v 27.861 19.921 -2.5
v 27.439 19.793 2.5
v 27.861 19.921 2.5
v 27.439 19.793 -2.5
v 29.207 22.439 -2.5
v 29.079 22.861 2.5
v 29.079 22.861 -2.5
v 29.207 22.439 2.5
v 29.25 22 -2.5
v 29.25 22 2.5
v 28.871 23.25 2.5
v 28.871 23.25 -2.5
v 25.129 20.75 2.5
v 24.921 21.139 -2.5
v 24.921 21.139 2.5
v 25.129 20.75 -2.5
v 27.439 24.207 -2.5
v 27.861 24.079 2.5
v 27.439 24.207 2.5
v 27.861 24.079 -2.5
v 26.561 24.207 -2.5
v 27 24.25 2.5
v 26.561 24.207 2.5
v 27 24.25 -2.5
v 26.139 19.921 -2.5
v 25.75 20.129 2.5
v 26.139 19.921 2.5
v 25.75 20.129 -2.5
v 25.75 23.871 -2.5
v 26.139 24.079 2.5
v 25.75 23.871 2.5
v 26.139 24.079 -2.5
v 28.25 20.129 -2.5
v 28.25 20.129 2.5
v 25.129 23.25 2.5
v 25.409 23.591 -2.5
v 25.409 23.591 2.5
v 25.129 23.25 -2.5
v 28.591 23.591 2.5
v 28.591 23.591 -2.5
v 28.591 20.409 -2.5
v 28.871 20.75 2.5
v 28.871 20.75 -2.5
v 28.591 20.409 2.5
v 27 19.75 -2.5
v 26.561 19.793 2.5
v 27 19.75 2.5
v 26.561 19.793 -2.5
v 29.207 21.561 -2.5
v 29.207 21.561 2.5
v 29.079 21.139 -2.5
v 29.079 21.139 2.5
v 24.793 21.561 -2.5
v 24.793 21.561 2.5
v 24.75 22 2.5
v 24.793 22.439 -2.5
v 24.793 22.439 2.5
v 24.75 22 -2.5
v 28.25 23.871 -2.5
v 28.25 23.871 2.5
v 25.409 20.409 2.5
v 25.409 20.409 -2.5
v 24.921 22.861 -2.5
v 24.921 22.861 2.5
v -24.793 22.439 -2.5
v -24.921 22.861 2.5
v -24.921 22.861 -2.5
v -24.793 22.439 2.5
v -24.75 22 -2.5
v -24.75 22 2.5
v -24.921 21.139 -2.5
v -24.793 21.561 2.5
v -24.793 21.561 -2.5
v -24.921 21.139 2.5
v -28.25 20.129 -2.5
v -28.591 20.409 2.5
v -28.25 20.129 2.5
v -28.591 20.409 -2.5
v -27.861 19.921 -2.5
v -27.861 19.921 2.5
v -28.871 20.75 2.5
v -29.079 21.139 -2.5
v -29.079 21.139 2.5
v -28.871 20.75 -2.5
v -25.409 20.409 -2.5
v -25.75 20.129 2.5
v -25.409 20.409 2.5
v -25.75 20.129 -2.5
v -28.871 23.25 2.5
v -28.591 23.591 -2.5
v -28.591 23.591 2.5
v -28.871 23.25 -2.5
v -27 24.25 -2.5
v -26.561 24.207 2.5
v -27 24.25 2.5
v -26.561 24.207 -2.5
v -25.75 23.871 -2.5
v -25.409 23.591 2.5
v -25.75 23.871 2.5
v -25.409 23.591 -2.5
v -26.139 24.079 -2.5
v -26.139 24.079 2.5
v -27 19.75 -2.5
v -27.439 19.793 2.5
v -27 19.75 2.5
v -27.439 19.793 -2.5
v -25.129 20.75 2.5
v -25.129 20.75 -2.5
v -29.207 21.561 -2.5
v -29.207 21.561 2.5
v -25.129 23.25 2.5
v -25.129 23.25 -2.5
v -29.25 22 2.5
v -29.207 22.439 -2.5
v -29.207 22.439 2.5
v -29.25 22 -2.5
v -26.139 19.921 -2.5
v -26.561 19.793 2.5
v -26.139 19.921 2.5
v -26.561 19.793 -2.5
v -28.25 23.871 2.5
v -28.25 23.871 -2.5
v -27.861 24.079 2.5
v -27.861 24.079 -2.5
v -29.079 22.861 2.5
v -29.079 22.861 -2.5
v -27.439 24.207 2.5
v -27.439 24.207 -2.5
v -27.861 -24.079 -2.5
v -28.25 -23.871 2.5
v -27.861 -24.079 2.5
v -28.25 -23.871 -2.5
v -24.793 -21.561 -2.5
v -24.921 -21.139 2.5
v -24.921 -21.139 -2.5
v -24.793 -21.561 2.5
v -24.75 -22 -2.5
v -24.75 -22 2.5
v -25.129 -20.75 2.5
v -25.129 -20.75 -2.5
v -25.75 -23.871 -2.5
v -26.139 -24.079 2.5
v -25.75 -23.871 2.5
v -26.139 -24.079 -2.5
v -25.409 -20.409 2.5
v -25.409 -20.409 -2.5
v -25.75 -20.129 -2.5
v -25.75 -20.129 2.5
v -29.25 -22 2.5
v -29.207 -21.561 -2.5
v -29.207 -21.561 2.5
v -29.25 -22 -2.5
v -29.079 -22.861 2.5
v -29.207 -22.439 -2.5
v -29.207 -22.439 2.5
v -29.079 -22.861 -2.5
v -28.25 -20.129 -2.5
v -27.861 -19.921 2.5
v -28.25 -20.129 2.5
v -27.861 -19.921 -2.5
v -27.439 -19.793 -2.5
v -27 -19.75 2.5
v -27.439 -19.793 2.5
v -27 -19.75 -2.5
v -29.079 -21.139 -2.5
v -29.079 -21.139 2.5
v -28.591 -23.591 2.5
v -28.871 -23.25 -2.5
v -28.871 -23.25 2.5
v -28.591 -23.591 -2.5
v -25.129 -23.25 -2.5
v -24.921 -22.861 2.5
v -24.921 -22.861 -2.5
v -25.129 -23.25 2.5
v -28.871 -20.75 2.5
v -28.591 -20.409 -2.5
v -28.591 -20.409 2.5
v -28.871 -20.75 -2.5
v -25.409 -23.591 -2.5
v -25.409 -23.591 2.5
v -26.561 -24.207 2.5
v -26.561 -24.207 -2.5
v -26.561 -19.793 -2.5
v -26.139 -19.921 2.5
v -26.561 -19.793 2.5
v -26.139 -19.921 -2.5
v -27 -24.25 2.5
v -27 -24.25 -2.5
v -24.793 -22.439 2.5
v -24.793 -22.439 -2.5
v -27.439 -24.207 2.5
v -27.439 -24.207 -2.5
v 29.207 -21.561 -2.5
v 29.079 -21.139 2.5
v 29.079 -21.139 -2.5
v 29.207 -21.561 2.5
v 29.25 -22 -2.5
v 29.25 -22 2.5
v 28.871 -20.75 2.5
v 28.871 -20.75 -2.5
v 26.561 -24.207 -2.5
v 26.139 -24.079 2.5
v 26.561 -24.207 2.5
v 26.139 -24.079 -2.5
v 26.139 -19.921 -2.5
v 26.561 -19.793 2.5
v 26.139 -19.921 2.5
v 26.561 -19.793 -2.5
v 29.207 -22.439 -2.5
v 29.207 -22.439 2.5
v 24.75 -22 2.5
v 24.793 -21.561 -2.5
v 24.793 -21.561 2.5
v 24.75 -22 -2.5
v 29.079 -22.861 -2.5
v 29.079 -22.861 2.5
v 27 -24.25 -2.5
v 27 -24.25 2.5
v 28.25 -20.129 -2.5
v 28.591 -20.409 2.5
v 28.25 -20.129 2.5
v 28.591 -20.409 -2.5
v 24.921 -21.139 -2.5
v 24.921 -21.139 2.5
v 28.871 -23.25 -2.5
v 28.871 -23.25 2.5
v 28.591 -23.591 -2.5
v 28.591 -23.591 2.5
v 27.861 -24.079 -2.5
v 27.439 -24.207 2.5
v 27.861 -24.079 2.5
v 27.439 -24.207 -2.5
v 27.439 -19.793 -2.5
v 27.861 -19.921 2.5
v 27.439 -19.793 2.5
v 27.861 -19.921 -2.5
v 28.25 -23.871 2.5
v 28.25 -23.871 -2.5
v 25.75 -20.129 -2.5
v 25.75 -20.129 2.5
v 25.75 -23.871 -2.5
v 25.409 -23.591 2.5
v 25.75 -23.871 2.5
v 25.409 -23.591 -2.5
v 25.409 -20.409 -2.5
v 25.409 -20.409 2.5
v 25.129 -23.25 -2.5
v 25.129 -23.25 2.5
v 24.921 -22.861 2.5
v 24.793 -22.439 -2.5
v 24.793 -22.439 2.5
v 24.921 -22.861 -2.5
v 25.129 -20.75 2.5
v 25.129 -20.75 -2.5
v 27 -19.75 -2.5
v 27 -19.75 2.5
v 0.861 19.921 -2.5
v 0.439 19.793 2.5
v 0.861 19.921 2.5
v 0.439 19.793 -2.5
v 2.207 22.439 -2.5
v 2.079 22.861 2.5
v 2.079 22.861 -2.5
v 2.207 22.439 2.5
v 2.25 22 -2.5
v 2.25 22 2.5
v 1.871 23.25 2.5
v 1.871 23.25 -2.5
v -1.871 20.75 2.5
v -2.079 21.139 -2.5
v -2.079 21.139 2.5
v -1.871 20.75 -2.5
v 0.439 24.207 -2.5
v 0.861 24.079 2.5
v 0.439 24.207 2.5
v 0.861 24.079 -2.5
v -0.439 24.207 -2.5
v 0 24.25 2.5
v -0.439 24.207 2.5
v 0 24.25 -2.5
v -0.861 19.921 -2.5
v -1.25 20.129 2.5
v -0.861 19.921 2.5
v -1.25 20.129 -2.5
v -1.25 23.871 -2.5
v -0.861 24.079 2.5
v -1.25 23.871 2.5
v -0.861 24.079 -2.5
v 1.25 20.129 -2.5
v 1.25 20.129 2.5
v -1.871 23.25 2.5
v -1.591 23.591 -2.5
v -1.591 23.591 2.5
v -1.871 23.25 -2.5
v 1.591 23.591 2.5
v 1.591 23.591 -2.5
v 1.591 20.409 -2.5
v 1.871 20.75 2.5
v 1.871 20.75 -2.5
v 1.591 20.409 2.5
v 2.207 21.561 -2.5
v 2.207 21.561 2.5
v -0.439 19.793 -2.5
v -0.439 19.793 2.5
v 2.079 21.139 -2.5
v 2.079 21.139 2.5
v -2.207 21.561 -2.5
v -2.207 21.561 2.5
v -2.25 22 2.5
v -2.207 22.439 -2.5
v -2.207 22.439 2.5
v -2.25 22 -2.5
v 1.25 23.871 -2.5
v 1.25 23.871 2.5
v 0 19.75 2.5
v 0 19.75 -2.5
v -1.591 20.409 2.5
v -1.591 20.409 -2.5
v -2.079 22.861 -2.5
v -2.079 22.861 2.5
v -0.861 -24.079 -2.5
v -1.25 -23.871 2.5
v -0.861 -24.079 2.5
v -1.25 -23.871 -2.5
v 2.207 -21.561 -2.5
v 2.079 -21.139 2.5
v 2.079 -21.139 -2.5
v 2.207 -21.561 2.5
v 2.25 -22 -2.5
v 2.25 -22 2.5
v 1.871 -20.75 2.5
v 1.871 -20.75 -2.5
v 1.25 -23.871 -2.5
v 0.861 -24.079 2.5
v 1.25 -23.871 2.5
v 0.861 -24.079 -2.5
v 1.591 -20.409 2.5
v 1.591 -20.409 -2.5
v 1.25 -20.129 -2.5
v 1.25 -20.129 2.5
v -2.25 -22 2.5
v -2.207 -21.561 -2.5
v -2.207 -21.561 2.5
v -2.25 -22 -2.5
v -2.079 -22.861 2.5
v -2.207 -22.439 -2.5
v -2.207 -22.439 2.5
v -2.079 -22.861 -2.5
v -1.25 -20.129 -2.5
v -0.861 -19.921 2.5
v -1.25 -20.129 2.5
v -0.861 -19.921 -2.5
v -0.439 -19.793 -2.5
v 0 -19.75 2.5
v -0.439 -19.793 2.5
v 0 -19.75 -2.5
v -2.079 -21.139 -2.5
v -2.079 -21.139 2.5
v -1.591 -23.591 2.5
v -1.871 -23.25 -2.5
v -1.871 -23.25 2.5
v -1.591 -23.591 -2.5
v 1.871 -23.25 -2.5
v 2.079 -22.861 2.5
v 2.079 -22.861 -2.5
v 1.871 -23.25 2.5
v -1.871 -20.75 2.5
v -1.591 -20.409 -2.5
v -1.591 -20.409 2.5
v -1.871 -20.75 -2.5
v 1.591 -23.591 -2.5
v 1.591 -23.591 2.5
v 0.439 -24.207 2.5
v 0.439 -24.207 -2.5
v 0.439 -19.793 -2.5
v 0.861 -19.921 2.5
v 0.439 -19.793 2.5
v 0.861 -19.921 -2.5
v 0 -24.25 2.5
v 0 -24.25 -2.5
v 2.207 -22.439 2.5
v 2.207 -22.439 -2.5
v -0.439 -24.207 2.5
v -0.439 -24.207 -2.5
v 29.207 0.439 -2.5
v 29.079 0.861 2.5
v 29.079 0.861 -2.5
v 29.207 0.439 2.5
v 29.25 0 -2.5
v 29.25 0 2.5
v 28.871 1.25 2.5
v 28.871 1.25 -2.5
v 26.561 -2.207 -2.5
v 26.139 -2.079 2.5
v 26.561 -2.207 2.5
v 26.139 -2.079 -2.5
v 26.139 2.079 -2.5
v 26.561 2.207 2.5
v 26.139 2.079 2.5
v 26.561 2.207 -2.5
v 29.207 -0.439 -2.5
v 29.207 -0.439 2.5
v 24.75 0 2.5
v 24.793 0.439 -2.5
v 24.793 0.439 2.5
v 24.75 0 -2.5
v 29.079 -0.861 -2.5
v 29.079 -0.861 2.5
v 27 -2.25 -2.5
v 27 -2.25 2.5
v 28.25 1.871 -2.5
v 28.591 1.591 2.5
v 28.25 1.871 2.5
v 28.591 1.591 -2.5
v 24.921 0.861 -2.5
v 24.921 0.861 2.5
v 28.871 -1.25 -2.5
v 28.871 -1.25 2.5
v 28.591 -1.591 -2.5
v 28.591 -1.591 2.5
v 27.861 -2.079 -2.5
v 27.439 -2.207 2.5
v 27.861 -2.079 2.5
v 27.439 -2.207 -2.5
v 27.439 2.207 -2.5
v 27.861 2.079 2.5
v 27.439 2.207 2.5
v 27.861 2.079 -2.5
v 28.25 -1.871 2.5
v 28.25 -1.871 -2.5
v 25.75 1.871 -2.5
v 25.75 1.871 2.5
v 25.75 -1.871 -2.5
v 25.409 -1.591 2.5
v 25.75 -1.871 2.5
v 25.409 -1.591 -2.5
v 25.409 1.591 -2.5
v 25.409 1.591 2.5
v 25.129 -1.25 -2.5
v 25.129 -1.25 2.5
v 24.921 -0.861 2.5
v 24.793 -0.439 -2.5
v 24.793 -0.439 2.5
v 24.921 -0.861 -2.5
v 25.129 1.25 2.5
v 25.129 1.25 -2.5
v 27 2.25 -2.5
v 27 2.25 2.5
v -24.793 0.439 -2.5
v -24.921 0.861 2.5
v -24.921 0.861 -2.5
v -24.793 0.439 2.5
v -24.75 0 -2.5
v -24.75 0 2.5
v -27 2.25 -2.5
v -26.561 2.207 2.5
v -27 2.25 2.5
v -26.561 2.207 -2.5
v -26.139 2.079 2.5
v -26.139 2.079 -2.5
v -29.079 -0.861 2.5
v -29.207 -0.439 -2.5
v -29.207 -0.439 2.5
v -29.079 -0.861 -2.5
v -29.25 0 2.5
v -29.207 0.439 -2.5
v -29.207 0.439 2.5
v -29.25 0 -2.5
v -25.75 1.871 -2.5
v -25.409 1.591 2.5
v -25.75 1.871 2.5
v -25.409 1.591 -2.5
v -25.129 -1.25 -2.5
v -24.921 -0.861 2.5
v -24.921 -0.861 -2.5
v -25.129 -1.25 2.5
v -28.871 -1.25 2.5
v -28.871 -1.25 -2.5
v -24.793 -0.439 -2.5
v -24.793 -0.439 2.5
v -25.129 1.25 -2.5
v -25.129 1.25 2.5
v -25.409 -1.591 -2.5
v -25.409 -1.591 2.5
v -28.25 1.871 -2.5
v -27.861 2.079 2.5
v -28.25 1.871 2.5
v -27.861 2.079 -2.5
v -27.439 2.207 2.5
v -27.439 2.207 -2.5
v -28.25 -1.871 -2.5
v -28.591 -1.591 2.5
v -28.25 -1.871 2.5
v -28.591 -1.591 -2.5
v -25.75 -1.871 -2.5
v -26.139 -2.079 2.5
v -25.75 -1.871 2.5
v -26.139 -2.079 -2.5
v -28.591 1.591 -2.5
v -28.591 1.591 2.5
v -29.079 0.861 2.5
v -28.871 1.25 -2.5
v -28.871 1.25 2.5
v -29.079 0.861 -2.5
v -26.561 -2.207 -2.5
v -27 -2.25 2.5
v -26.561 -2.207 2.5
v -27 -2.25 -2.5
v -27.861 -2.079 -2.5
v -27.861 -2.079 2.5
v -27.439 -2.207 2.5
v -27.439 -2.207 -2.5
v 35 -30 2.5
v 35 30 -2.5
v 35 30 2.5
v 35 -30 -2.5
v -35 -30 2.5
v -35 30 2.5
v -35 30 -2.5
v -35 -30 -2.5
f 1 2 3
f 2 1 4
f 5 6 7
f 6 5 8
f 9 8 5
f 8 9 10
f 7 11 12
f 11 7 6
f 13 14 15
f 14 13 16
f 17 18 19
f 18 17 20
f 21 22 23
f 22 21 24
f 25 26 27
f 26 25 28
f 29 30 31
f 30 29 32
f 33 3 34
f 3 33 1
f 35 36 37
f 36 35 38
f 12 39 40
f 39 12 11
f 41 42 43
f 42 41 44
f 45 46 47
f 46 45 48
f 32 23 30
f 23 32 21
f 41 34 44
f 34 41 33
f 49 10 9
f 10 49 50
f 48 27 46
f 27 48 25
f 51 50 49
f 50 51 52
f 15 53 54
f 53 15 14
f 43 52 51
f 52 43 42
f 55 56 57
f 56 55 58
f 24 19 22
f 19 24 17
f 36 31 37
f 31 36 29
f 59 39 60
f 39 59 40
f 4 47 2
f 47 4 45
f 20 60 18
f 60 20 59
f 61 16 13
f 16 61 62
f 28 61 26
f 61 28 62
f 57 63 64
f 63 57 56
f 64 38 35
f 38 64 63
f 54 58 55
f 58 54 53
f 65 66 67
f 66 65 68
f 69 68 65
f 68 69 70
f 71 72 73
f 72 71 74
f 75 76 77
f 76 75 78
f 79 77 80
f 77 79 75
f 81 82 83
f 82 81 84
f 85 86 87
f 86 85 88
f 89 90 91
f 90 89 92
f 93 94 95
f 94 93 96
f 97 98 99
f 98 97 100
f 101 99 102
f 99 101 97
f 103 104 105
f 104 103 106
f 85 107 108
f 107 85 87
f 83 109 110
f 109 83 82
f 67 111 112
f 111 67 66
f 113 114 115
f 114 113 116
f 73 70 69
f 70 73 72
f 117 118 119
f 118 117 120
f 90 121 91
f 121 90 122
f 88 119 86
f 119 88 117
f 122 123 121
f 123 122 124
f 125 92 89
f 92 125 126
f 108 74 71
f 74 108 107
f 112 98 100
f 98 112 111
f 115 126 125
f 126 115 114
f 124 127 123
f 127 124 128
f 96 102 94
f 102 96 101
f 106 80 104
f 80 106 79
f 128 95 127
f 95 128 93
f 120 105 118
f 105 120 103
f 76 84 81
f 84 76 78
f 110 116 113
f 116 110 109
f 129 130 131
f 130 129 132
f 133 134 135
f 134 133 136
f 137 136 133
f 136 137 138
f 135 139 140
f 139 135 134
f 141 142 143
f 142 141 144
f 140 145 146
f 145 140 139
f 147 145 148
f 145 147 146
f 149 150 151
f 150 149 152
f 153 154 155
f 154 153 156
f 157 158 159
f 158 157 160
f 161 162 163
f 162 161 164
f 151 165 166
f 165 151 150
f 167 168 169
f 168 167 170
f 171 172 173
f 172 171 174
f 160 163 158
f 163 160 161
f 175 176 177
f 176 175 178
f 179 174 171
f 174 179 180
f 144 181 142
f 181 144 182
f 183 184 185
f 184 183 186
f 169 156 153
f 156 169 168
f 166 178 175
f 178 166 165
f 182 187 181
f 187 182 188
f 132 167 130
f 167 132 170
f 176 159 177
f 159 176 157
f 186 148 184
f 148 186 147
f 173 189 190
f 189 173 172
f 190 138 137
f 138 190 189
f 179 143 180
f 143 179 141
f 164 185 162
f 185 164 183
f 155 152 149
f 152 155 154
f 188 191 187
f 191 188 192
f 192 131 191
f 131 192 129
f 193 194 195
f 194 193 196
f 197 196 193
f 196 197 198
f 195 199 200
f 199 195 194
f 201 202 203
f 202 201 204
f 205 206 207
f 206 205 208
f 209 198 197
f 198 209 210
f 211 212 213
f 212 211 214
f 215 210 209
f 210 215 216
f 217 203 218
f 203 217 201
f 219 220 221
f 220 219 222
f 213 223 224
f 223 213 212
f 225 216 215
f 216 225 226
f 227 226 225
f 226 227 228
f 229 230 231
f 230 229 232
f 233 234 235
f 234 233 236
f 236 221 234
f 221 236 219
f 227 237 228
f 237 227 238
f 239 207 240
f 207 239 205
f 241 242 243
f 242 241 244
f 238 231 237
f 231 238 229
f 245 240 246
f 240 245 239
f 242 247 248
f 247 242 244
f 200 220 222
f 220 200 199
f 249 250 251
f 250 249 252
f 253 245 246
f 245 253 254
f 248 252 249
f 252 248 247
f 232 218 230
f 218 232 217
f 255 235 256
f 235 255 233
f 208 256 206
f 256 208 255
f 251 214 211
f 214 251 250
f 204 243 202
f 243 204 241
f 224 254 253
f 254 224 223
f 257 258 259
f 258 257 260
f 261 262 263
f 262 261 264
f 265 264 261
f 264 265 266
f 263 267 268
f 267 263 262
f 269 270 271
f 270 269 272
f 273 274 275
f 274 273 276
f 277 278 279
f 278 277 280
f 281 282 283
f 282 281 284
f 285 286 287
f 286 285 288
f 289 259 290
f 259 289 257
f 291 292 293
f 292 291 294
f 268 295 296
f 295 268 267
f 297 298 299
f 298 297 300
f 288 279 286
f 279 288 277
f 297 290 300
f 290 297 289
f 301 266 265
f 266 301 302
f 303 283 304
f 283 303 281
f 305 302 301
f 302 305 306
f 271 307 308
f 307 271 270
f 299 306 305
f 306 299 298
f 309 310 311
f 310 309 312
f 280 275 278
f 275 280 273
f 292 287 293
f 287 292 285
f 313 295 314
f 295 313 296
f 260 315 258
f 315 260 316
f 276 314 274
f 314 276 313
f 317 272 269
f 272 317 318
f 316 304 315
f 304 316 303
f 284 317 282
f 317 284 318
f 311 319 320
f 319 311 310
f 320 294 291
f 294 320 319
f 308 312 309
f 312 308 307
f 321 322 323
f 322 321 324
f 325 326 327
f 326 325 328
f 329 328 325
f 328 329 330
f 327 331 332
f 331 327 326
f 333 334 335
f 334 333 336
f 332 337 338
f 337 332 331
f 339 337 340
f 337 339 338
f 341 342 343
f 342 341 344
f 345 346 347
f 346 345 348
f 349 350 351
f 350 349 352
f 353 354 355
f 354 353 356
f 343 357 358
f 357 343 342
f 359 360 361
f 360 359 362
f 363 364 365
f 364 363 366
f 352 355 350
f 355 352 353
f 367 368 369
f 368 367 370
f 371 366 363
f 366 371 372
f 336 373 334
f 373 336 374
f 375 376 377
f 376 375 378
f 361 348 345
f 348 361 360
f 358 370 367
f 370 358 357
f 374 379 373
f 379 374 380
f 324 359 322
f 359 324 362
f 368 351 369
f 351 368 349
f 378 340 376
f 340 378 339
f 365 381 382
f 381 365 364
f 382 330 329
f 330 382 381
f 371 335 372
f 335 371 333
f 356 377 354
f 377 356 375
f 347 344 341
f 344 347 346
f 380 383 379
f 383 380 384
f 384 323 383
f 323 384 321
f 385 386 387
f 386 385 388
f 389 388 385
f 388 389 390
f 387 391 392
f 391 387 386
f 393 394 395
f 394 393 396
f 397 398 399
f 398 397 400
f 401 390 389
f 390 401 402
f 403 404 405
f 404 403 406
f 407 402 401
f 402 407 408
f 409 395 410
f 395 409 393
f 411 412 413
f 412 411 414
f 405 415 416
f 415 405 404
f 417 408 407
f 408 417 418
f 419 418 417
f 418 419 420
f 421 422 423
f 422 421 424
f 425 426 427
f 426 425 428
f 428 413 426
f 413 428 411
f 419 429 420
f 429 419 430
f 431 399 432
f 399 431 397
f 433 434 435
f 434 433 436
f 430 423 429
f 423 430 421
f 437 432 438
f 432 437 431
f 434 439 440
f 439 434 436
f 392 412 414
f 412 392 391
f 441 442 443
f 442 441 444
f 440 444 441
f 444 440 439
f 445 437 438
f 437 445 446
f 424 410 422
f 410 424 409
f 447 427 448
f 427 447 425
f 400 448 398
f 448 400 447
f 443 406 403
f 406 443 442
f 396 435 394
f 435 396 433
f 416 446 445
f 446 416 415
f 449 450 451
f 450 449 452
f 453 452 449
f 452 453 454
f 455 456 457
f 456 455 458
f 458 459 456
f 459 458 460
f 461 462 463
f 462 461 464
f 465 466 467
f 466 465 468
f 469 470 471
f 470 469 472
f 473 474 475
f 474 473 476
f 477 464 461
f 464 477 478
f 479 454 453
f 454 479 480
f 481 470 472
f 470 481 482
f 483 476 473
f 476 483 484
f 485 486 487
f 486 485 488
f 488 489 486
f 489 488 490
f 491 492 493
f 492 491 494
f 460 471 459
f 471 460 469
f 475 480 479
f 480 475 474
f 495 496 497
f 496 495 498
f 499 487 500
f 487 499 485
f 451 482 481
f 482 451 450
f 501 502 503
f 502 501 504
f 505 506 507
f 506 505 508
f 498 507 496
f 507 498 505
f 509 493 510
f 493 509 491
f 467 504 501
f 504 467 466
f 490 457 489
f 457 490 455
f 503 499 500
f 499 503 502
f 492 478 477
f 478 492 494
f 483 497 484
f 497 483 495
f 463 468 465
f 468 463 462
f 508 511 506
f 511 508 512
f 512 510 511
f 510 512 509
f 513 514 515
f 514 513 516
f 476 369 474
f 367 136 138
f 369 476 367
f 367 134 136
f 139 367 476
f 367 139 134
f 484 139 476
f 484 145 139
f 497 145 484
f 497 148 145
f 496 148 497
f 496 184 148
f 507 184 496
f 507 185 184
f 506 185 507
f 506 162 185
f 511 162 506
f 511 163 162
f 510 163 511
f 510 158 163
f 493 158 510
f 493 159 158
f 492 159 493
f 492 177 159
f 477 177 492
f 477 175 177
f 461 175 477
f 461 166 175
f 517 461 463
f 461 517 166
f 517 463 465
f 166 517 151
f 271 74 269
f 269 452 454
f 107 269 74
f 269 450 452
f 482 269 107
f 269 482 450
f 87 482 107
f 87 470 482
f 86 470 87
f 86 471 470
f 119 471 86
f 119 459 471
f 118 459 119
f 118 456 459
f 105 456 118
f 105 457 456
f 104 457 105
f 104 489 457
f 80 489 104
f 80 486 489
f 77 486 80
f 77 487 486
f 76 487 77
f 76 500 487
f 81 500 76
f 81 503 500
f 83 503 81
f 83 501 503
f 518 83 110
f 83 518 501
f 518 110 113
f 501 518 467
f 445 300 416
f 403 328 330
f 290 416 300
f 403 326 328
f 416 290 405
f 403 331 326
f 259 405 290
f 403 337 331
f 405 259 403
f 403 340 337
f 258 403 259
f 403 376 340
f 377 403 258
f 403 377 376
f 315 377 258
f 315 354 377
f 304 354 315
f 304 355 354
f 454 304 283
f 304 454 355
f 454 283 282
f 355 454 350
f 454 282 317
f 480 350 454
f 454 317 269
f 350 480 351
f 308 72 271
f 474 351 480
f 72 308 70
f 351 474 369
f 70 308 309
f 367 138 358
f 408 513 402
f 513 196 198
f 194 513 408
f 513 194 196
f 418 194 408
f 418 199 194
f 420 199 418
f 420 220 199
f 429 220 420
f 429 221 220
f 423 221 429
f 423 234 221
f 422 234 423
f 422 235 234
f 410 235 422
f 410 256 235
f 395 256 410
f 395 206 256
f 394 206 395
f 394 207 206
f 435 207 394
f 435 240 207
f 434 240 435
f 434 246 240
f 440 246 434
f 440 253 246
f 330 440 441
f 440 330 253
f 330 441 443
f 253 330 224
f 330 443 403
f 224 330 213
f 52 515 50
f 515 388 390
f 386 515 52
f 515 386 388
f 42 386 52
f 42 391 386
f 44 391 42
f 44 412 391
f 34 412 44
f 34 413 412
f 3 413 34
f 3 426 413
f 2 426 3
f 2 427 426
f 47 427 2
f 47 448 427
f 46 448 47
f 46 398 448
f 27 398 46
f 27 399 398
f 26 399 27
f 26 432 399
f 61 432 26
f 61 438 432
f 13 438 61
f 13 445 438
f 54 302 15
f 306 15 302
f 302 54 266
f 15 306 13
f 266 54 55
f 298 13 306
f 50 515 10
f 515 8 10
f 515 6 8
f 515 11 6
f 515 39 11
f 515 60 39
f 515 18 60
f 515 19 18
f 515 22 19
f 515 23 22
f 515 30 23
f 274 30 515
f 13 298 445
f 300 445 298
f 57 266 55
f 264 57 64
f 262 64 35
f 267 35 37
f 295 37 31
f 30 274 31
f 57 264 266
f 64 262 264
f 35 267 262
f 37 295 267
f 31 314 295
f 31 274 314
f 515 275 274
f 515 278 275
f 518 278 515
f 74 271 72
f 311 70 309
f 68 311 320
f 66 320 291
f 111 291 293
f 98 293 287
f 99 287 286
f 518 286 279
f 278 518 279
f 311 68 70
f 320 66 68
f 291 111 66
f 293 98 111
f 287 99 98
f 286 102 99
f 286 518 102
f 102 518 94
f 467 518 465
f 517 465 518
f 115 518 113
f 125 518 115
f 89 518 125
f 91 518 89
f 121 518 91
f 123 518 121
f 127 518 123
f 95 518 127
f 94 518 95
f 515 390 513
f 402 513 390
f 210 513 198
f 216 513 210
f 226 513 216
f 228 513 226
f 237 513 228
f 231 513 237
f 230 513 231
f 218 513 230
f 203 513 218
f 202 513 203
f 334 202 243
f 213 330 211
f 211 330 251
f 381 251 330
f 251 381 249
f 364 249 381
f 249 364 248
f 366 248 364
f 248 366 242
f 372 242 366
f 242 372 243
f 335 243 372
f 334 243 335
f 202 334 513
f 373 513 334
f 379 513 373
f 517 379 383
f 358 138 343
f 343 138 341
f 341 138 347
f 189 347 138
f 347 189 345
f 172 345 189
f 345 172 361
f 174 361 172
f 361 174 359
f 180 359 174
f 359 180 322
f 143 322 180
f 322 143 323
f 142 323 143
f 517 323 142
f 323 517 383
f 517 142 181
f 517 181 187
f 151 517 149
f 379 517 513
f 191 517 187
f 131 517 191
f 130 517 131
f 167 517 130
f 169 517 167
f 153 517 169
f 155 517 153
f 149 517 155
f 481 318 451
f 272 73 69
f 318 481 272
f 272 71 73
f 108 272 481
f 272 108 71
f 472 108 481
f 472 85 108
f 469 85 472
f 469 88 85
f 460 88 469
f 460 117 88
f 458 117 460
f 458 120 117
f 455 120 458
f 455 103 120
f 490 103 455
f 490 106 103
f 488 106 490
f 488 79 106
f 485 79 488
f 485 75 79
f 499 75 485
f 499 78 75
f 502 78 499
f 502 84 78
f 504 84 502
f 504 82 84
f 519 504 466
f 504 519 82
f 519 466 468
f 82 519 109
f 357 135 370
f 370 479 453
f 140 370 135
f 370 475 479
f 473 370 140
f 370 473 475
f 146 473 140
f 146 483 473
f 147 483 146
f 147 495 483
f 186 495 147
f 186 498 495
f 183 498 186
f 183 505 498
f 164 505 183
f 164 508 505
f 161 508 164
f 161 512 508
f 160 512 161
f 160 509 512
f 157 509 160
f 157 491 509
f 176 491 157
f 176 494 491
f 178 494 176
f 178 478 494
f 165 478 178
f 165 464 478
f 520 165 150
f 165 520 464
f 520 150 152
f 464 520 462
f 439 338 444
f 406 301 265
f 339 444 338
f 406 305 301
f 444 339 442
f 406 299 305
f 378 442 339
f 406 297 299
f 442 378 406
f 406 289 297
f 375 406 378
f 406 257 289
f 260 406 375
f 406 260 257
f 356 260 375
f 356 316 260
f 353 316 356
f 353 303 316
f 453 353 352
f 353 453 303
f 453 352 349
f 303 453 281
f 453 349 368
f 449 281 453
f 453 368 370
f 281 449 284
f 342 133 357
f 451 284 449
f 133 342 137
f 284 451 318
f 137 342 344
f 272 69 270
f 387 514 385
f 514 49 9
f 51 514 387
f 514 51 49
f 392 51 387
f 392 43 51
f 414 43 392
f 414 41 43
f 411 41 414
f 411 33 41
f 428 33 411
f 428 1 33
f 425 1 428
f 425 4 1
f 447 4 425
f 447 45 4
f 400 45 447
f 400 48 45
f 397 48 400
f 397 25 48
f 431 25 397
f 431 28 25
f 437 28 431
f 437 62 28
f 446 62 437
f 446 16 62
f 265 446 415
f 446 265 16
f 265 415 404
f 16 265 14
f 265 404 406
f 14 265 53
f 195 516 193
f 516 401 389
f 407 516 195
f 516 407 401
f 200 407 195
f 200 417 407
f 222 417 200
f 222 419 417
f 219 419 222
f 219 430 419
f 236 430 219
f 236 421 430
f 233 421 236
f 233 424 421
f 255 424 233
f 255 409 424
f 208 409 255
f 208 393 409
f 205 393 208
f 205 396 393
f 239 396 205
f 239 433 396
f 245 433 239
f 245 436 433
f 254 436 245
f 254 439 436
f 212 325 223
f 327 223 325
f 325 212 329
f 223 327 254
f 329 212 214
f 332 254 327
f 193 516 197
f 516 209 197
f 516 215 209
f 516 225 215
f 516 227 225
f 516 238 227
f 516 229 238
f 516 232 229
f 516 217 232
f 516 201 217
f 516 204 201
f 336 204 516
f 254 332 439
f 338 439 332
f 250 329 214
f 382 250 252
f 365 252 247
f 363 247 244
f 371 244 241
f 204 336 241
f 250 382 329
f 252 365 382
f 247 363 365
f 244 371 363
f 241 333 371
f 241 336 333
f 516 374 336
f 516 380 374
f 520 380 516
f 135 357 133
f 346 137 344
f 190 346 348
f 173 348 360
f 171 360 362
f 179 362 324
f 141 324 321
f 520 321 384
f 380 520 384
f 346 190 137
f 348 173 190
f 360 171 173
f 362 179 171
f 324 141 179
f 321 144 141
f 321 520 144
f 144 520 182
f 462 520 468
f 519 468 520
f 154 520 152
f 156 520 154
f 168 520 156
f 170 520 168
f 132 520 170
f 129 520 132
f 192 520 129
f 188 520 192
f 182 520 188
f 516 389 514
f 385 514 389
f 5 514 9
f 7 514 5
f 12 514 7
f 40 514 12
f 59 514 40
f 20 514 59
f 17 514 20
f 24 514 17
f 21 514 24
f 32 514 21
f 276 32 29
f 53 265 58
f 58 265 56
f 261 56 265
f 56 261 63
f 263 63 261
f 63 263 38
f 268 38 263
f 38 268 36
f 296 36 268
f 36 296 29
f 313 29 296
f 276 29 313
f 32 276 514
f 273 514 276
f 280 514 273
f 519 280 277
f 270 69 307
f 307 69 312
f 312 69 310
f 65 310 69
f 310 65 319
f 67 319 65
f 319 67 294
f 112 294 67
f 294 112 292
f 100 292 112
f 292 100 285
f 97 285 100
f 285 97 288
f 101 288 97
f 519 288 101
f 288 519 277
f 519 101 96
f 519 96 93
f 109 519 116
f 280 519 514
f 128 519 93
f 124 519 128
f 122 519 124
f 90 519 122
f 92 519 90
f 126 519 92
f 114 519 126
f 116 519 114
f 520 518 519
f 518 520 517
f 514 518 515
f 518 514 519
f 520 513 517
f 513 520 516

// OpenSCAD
$fn = 32;

// ----------------------------------------------------------------------
// Corner plate 70 x 60 x 5
// 8 holes, centres taken from the edge offset
// ----------------------------------------------------------------------

// --- parameters (mm) ---
plate = [70, 60, 5];  // overall size (x, y, z)
seat_tol = 0.05;      // tolerance at the seating features
free_tol = 0.3;       // general tolerance on the free sizes
holes = 8;            // number of holes the drawing asks for
hole_d = 4.5;         // hole diameter
edge = 8;             // hole centre offset from the plate edge

// --- derived feature positions (mm) ---
corner_x = plate[0] / 2 - edge;  // = 27   corner hole X
corner_y = plate[1] / 2 - edge;  // = 22   corner hole Y
feature_centers = [
  [corner_x, corner_y],
  [-corner_x, corner_y],
  [-corner_x, -corner_y],
  [corner_x, -corner_y],
  [0, corner_y],
  [0, -corner_y],
  [corner_x, 0],
  [-corner_x, 0]
];   // hole centres the loop below drills

// plate outline, every hole drilled through with the same cutters
difference() {
  cube(plate, center = true);
  for (centre = feature_centers)
    translate([centre[0], centre[1], 0])
      cylinder(d = hole_d, h = plate[2] + 2, center = true);
}
